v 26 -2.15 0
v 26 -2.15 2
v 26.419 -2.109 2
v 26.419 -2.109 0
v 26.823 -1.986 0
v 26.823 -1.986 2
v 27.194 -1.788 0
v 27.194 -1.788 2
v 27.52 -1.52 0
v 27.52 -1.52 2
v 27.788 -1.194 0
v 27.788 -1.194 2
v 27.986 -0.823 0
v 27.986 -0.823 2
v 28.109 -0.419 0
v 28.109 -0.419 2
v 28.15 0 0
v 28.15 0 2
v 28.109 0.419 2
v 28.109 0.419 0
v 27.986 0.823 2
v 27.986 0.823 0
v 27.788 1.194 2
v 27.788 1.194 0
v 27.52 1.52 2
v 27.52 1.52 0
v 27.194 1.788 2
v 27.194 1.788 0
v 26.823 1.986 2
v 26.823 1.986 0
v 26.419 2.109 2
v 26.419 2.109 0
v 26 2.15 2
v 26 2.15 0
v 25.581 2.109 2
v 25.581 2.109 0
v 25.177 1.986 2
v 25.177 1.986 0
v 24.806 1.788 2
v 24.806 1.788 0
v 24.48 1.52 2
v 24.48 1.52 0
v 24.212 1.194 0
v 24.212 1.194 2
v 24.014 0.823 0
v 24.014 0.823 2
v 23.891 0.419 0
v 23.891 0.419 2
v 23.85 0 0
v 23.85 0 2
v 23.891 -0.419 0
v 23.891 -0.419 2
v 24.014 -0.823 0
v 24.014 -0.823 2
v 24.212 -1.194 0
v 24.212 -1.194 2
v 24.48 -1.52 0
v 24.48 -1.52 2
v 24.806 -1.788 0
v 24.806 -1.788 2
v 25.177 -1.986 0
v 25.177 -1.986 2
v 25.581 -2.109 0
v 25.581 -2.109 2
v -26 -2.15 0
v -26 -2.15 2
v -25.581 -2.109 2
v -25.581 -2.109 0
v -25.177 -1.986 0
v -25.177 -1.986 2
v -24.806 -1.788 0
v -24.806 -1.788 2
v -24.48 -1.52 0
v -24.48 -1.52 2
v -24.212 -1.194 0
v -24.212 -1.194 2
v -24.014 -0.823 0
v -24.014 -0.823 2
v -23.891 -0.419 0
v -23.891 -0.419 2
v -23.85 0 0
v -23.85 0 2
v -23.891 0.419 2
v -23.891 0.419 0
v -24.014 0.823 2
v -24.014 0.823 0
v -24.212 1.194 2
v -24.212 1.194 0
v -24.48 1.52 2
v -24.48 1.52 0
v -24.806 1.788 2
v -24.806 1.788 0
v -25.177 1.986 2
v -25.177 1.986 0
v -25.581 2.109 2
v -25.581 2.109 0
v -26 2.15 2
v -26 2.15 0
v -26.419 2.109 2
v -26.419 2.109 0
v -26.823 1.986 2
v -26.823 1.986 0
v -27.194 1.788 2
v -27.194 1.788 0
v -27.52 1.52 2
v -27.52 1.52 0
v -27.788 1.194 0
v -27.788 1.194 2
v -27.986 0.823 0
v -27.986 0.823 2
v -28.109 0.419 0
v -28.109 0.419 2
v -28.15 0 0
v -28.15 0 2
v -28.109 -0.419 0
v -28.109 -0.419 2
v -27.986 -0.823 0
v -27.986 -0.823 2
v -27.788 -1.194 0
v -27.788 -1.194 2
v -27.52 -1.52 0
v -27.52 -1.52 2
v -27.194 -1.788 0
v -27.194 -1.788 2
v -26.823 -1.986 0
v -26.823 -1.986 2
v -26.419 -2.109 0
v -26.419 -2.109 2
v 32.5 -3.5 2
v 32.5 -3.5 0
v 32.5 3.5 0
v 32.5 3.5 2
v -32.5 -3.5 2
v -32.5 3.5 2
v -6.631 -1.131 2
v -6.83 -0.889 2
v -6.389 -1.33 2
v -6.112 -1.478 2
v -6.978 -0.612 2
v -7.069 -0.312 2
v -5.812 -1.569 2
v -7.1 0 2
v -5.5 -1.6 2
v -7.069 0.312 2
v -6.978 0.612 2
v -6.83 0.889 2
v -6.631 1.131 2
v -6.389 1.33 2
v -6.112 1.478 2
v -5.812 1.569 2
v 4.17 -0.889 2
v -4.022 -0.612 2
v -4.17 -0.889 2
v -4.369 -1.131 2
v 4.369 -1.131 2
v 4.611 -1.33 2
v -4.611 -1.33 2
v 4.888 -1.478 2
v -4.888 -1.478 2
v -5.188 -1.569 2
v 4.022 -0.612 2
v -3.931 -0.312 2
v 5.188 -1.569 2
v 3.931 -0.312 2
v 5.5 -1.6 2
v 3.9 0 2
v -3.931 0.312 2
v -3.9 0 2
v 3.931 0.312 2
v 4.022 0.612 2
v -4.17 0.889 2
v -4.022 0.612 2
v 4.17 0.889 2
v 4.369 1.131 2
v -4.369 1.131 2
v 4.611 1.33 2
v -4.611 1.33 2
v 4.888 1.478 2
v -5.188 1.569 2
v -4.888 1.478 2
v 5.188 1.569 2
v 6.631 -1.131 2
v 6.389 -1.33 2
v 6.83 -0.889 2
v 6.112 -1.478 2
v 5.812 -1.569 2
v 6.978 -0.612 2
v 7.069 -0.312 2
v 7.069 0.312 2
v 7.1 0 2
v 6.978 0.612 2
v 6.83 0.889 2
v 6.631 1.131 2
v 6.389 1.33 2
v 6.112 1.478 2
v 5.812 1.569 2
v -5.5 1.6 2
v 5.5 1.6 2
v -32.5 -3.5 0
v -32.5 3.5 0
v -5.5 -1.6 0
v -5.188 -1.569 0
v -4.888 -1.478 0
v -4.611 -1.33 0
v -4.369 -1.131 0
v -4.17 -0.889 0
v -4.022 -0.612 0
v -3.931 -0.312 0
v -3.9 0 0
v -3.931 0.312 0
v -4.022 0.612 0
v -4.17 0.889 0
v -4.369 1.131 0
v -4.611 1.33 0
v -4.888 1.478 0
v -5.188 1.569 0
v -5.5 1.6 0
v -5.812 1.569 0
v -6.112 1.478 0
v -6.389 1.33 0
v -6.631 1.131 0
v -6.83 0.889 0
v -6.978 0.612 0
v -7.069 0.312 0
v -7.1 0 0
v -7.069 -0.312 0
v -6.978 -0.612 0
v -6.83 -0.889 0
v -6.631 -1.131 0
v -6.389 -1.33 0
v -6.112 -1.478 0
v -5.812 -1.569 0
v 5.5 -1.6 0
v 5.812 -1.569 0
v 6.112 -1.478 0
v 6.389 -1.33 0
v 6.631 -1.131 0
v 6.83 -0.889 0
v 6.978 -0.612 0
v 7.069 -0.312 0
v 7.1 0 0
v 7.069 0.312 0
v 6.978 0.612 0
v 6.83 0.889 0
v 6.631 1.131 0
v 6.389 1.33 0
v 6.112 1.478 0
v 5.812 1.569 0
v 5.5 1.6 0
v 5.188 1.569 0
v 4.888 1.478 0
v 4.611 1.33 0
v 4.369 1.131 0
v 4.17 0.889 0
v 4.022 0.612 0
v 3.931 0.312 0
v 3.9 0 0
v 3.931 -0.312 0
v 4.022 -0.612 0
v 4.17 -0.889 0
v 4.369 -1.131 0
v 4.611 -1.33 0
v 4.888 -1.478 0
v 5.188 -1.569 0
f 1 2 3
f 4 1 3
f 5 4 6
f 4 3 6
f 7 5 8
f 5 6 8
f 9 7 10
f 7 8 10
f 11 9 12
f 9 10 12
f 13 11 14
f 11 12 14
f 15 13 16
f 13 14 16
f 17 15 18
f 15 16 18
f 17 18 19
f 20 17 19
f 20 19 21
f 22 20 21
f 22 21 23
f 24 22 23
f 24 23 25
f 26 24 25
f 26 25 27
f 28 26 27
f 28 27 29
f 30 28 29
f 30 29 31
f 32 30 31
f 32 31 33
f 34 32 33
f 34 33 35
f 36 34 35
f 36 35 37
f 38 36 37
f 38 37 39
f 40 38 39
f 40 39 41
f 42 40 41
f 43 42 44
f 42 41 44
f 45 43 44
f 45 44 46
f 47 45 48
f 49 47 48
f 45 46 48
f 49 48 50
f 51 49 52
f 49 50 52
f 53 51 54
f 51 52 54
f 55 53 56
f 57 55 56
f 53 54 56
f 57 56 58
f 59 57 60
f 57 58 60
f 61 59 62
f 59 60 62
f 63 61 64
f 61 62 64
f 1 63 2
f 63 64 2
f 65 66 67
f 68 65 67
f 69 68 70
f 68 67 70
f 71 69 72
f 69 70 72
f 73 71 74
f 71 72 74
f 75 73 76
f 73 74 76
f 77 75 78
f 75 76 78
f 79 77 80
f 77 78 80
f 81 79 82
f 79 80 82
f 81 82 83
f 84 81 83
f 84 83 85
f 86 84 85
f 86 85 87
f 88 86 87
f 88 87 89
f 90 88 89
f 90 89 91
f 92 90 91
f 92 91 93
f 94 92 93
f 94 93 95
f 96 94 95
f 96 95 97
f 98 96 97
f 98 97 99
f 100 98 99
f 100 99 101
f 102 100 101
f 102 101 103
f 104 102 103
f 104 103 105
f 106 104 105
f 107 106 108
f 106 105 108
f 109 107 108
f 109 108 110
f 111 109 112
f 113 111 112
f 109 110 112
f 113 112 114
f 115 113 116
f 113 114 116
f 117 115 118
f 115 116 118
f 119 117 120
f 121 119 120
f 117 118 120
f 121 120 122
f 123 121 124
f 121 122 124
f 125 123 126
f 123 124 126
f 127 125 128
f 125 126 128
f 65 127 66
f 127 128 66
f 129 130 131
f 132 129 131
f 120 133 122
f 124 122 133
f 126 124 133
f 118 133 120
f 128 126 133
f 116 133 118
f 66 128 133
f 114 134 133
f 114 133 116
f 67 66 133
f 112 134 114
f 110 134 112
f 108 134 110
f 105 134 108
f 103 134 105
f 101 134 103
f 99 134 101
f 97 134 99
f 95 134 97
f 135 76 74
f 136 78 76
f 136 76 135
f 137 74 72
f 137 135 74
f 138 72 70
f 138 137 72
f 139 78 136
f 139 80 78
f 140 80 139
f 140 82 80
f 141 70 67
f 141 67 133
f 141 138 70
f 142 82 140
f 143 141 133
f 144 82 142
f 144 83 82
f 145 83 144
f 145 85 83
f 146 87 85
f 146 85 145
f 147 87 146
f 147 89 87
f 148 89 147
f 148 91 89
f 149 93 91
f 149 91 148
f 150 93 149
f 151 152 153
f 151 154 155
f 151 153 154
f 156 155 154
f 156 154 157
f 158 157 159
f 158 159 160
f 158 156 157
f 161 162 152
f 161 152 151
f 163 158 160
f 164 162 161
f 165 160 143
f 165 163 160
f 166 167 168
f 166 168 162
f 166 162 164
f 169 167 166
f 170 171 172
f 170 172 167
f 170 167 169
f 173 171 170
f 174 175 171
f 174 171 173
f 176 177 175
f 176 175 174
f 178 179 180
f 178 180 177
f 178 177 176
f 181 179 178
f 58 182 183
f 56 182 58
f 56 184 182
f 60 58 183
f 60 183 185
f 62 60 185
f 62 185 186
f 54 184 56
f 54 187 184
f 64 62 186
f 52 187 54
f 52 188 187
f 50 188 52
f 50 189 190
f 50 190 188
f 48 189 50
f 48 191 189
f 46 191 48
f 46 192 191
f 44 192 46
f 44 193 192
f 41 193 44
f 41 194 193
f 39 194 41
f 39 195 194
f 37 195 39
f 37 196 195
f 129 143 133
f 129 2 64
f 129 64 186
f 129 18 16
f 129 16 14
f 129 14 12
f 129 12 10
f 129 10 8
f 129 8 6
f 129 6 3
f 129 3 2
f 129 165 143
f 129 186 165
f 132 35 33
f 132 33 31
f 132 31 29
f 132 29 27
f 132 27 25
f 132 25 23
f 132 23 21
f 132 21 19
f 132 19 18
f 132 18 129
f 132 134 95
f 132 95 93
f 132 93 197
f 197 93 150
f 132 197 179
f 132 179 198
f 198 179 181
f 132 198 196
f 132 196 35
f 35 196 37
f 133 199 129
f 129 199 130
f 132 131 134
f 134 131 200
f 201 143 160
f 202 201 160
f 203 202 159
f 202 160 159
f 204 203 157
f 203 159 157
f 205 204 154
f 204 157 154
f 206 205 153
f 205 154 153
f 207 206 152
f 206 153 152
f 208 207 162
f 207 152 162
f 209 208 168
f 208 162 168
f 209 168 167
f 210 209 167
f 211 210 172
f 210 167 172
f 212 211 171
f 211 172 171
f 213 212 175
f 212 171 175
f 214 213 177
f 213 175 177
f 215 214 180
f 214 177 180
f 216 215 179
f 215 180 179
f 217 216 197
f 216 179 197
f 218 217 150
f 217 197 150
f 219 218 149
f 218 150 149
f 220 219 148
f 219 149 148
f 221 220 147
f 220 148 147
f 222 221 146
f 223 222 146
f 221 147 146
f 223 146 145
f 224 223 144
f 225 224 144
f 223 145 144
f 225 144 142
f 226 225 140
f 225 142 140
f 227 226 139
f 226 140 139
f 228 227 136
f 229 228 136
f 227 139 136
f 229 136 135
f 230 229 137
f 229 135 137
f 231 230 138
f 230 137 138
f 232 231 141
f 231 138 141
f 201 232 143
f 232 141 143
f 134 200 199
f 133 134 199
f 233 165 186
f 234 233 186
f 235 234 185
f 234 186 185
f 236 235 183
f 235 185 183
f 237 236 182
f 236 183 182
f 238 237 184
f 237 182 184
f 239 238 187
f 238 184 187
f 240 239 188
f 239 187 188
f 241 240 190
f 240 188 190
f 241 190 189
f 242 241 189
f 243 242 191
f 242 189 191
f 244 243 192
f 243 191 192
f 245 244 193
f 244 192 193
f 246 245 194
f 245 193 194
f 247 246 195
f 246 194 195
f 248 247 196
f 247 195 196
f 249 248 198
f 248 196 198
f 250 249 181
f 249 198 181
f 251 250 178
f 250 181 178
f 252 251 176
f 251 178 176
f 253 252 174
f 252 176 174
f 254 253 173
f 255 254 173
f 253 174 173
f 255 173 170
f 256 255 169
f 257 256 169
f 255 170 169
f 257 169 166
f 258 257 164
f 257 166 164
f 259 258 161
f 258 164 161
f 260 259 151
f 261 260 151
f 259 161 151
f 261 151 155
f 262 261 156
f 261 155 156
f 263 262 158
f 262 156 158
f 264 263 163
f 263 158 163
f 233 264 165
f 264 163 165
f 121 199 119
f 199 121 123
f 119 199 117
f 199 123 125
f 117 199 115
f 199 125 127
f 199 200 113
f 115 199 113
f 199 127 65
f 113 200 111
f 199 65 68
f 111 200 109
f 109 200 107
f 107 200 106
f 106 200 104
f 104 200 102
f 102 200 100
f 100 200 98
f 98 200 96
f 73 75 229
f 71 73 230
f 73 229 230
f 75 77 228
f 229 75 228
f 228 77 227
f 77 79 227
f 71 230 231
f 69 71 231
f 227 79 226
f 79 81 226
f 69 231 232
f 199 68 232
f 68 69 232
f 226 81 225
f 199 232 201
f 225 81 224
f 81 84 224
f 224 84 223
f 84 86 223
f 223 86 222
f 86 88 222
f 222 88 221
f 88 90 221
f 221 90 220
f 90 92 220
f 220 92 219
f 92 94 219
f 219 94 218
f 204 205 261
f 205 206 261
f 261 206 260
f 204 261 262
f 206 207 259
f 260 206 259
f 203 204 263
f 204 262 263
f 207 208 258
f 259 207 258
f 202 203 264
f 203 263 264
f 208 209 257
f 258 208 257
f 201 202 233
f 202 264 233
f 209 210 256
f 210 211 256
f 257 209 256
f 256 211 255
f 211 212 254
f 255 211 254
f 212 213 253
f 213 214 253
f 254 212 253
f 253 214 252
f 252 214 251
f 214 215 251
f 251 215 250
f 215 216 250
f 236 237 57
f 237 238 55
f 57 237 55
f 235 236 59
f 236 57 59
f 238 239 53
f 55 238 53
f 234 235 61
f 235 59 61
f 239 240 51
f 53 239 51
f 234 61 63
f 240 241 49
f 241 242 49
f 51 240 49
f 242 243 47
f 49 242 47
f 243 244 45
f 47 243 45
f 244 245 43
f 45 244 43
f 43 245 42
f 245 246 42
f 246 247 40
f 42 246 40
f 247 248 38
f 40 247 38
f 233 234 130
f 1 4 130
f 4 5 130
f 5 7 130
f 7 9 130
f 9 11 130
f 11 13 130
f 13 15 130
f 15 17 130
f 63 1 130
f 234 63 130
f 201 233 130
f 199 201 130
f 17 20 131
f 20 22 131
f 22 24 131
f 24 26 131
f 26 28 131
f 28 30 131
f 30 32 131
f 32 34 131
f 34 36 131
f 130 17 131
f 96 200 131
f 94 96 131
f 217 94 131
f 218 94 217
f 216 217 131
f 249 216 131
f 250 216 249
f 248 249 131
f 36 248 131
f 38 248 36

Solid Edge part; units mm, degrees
sketch "Sketch1" plane through (0, 0, 0) normal (0, 0, 1) x (1, 0, 0)
  line L0 (-32.5, -3.5) -> (32.5, -3.5)
  line L1 (32.5, -3.5) -> (32.5, 3.5)
  line L2 (32.5, 3.5) -> (-32.5, 3.5)
  line L3 (-32.5, 3.5) -> (-32.5, -3.5)
extrude "Extrusionsausprägung_1" add sketch "Sketch1" along normal blind 2
hole "Bohrung_1" at (-26, 0, 2) direction (0, 0, -1) diameter 4.3 end up to next
hole "Hole1" at (26, 0, 2) direction (0, 0, -1) diameter 4.3 end up to next
hole "Bohrung_3" at (-5.5, 0, 2) direction (0, 0, -1) diameter 3.2 end up to next
hole "Hole2" at (5.5, 0, 2) direction (0, 0, -1) diameter 3.2 end up to next
properties material "Acryl, hoher Anschlag"
